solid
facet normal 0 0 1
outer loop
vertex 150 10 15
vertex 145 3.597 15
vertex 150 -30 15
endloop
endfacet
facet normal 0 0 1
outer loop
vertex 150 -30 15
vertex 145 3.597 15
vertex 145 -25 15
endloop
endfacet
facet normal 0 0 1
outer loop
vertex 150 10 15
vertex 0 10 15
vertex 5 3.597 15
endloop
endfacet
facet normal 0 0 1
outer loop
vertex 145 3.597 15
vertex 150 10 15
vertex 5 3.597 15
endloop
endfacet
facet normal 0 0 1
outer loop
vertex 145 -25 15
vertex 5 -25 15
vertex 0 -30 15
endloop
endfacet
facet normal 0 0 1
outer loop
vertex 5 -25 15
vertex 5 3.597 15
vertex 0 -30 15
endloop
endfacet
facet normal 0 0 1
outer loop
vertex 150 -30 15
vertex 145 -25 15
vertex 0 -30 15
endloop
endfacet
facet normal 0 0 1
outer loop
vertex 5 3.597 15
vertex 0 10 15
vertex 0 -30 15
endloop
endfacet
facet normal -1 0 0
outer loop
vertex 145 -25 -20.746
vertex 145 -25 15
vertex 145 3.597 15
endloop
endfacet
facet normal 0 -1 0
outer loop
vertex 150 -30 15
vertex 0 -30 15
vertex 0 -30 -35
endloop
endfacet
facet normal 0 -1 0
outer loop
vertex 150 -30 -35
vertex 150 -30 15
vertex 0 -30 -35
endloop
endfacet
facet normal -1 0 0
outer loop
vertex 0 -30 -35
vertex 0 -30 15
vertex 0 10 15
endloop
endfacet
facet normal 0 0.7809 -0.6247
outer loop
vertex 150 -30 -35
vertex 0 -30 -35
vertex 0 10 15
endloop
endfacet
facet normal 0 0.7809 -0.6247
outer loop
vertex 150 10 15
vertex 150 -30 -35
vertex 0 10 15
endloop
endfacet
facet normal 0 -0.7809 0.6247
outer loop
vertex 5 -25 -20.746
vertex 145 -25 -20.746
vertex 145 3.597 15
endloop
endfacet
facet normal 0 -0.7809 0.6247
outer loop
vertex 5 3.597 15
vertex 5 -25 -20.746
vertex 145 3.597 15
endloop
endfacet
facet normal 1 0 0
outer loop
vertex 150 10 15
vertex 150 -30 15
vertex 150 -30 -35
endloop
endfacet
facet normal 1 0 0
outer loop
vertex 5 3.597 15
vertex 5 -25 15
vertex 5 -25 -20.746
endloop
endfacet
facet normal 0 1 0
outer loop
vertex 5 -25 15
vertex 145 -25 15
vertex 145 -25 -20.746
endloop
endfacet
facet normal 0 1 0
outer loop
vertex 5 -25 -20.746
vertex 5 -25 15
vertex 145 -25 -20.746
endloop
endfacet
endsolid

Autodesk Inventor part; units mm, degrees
ref_plane "YZ Plane" through (0, 0, 0) normal (1, 0, 0) x (0, 1, 0)
ref_plane "XZ Plane" through (0, 0, 0) normal (0, 1, 0) x (-1, 0, 0)
ref_plane "XY Plane" through (0, 0, 0) normal (0, 0, 1) x (1, 0, 0)
sketch "Szkic1" plane through (0, 0, 0) normal (1, 0, 0) x (0, 1, 0)
  line L0 (10, 15) -> (-30, 15)
  line L1 (-30, 15) -> (-30, -35)
  line L2 (-30, -35) -> (10, 15)
  point P0 (0, 0)
  dimension "d0" = 40
  dimension "d1" = 50
extrude "Wyciągnięcie proste1" add sketch "Szkic1" along normal blind 150
shell "Skorupa2" thickness 5 removed faces 1 at (50, -3.3333, 15)
properties part number "sumo_module_shield"
